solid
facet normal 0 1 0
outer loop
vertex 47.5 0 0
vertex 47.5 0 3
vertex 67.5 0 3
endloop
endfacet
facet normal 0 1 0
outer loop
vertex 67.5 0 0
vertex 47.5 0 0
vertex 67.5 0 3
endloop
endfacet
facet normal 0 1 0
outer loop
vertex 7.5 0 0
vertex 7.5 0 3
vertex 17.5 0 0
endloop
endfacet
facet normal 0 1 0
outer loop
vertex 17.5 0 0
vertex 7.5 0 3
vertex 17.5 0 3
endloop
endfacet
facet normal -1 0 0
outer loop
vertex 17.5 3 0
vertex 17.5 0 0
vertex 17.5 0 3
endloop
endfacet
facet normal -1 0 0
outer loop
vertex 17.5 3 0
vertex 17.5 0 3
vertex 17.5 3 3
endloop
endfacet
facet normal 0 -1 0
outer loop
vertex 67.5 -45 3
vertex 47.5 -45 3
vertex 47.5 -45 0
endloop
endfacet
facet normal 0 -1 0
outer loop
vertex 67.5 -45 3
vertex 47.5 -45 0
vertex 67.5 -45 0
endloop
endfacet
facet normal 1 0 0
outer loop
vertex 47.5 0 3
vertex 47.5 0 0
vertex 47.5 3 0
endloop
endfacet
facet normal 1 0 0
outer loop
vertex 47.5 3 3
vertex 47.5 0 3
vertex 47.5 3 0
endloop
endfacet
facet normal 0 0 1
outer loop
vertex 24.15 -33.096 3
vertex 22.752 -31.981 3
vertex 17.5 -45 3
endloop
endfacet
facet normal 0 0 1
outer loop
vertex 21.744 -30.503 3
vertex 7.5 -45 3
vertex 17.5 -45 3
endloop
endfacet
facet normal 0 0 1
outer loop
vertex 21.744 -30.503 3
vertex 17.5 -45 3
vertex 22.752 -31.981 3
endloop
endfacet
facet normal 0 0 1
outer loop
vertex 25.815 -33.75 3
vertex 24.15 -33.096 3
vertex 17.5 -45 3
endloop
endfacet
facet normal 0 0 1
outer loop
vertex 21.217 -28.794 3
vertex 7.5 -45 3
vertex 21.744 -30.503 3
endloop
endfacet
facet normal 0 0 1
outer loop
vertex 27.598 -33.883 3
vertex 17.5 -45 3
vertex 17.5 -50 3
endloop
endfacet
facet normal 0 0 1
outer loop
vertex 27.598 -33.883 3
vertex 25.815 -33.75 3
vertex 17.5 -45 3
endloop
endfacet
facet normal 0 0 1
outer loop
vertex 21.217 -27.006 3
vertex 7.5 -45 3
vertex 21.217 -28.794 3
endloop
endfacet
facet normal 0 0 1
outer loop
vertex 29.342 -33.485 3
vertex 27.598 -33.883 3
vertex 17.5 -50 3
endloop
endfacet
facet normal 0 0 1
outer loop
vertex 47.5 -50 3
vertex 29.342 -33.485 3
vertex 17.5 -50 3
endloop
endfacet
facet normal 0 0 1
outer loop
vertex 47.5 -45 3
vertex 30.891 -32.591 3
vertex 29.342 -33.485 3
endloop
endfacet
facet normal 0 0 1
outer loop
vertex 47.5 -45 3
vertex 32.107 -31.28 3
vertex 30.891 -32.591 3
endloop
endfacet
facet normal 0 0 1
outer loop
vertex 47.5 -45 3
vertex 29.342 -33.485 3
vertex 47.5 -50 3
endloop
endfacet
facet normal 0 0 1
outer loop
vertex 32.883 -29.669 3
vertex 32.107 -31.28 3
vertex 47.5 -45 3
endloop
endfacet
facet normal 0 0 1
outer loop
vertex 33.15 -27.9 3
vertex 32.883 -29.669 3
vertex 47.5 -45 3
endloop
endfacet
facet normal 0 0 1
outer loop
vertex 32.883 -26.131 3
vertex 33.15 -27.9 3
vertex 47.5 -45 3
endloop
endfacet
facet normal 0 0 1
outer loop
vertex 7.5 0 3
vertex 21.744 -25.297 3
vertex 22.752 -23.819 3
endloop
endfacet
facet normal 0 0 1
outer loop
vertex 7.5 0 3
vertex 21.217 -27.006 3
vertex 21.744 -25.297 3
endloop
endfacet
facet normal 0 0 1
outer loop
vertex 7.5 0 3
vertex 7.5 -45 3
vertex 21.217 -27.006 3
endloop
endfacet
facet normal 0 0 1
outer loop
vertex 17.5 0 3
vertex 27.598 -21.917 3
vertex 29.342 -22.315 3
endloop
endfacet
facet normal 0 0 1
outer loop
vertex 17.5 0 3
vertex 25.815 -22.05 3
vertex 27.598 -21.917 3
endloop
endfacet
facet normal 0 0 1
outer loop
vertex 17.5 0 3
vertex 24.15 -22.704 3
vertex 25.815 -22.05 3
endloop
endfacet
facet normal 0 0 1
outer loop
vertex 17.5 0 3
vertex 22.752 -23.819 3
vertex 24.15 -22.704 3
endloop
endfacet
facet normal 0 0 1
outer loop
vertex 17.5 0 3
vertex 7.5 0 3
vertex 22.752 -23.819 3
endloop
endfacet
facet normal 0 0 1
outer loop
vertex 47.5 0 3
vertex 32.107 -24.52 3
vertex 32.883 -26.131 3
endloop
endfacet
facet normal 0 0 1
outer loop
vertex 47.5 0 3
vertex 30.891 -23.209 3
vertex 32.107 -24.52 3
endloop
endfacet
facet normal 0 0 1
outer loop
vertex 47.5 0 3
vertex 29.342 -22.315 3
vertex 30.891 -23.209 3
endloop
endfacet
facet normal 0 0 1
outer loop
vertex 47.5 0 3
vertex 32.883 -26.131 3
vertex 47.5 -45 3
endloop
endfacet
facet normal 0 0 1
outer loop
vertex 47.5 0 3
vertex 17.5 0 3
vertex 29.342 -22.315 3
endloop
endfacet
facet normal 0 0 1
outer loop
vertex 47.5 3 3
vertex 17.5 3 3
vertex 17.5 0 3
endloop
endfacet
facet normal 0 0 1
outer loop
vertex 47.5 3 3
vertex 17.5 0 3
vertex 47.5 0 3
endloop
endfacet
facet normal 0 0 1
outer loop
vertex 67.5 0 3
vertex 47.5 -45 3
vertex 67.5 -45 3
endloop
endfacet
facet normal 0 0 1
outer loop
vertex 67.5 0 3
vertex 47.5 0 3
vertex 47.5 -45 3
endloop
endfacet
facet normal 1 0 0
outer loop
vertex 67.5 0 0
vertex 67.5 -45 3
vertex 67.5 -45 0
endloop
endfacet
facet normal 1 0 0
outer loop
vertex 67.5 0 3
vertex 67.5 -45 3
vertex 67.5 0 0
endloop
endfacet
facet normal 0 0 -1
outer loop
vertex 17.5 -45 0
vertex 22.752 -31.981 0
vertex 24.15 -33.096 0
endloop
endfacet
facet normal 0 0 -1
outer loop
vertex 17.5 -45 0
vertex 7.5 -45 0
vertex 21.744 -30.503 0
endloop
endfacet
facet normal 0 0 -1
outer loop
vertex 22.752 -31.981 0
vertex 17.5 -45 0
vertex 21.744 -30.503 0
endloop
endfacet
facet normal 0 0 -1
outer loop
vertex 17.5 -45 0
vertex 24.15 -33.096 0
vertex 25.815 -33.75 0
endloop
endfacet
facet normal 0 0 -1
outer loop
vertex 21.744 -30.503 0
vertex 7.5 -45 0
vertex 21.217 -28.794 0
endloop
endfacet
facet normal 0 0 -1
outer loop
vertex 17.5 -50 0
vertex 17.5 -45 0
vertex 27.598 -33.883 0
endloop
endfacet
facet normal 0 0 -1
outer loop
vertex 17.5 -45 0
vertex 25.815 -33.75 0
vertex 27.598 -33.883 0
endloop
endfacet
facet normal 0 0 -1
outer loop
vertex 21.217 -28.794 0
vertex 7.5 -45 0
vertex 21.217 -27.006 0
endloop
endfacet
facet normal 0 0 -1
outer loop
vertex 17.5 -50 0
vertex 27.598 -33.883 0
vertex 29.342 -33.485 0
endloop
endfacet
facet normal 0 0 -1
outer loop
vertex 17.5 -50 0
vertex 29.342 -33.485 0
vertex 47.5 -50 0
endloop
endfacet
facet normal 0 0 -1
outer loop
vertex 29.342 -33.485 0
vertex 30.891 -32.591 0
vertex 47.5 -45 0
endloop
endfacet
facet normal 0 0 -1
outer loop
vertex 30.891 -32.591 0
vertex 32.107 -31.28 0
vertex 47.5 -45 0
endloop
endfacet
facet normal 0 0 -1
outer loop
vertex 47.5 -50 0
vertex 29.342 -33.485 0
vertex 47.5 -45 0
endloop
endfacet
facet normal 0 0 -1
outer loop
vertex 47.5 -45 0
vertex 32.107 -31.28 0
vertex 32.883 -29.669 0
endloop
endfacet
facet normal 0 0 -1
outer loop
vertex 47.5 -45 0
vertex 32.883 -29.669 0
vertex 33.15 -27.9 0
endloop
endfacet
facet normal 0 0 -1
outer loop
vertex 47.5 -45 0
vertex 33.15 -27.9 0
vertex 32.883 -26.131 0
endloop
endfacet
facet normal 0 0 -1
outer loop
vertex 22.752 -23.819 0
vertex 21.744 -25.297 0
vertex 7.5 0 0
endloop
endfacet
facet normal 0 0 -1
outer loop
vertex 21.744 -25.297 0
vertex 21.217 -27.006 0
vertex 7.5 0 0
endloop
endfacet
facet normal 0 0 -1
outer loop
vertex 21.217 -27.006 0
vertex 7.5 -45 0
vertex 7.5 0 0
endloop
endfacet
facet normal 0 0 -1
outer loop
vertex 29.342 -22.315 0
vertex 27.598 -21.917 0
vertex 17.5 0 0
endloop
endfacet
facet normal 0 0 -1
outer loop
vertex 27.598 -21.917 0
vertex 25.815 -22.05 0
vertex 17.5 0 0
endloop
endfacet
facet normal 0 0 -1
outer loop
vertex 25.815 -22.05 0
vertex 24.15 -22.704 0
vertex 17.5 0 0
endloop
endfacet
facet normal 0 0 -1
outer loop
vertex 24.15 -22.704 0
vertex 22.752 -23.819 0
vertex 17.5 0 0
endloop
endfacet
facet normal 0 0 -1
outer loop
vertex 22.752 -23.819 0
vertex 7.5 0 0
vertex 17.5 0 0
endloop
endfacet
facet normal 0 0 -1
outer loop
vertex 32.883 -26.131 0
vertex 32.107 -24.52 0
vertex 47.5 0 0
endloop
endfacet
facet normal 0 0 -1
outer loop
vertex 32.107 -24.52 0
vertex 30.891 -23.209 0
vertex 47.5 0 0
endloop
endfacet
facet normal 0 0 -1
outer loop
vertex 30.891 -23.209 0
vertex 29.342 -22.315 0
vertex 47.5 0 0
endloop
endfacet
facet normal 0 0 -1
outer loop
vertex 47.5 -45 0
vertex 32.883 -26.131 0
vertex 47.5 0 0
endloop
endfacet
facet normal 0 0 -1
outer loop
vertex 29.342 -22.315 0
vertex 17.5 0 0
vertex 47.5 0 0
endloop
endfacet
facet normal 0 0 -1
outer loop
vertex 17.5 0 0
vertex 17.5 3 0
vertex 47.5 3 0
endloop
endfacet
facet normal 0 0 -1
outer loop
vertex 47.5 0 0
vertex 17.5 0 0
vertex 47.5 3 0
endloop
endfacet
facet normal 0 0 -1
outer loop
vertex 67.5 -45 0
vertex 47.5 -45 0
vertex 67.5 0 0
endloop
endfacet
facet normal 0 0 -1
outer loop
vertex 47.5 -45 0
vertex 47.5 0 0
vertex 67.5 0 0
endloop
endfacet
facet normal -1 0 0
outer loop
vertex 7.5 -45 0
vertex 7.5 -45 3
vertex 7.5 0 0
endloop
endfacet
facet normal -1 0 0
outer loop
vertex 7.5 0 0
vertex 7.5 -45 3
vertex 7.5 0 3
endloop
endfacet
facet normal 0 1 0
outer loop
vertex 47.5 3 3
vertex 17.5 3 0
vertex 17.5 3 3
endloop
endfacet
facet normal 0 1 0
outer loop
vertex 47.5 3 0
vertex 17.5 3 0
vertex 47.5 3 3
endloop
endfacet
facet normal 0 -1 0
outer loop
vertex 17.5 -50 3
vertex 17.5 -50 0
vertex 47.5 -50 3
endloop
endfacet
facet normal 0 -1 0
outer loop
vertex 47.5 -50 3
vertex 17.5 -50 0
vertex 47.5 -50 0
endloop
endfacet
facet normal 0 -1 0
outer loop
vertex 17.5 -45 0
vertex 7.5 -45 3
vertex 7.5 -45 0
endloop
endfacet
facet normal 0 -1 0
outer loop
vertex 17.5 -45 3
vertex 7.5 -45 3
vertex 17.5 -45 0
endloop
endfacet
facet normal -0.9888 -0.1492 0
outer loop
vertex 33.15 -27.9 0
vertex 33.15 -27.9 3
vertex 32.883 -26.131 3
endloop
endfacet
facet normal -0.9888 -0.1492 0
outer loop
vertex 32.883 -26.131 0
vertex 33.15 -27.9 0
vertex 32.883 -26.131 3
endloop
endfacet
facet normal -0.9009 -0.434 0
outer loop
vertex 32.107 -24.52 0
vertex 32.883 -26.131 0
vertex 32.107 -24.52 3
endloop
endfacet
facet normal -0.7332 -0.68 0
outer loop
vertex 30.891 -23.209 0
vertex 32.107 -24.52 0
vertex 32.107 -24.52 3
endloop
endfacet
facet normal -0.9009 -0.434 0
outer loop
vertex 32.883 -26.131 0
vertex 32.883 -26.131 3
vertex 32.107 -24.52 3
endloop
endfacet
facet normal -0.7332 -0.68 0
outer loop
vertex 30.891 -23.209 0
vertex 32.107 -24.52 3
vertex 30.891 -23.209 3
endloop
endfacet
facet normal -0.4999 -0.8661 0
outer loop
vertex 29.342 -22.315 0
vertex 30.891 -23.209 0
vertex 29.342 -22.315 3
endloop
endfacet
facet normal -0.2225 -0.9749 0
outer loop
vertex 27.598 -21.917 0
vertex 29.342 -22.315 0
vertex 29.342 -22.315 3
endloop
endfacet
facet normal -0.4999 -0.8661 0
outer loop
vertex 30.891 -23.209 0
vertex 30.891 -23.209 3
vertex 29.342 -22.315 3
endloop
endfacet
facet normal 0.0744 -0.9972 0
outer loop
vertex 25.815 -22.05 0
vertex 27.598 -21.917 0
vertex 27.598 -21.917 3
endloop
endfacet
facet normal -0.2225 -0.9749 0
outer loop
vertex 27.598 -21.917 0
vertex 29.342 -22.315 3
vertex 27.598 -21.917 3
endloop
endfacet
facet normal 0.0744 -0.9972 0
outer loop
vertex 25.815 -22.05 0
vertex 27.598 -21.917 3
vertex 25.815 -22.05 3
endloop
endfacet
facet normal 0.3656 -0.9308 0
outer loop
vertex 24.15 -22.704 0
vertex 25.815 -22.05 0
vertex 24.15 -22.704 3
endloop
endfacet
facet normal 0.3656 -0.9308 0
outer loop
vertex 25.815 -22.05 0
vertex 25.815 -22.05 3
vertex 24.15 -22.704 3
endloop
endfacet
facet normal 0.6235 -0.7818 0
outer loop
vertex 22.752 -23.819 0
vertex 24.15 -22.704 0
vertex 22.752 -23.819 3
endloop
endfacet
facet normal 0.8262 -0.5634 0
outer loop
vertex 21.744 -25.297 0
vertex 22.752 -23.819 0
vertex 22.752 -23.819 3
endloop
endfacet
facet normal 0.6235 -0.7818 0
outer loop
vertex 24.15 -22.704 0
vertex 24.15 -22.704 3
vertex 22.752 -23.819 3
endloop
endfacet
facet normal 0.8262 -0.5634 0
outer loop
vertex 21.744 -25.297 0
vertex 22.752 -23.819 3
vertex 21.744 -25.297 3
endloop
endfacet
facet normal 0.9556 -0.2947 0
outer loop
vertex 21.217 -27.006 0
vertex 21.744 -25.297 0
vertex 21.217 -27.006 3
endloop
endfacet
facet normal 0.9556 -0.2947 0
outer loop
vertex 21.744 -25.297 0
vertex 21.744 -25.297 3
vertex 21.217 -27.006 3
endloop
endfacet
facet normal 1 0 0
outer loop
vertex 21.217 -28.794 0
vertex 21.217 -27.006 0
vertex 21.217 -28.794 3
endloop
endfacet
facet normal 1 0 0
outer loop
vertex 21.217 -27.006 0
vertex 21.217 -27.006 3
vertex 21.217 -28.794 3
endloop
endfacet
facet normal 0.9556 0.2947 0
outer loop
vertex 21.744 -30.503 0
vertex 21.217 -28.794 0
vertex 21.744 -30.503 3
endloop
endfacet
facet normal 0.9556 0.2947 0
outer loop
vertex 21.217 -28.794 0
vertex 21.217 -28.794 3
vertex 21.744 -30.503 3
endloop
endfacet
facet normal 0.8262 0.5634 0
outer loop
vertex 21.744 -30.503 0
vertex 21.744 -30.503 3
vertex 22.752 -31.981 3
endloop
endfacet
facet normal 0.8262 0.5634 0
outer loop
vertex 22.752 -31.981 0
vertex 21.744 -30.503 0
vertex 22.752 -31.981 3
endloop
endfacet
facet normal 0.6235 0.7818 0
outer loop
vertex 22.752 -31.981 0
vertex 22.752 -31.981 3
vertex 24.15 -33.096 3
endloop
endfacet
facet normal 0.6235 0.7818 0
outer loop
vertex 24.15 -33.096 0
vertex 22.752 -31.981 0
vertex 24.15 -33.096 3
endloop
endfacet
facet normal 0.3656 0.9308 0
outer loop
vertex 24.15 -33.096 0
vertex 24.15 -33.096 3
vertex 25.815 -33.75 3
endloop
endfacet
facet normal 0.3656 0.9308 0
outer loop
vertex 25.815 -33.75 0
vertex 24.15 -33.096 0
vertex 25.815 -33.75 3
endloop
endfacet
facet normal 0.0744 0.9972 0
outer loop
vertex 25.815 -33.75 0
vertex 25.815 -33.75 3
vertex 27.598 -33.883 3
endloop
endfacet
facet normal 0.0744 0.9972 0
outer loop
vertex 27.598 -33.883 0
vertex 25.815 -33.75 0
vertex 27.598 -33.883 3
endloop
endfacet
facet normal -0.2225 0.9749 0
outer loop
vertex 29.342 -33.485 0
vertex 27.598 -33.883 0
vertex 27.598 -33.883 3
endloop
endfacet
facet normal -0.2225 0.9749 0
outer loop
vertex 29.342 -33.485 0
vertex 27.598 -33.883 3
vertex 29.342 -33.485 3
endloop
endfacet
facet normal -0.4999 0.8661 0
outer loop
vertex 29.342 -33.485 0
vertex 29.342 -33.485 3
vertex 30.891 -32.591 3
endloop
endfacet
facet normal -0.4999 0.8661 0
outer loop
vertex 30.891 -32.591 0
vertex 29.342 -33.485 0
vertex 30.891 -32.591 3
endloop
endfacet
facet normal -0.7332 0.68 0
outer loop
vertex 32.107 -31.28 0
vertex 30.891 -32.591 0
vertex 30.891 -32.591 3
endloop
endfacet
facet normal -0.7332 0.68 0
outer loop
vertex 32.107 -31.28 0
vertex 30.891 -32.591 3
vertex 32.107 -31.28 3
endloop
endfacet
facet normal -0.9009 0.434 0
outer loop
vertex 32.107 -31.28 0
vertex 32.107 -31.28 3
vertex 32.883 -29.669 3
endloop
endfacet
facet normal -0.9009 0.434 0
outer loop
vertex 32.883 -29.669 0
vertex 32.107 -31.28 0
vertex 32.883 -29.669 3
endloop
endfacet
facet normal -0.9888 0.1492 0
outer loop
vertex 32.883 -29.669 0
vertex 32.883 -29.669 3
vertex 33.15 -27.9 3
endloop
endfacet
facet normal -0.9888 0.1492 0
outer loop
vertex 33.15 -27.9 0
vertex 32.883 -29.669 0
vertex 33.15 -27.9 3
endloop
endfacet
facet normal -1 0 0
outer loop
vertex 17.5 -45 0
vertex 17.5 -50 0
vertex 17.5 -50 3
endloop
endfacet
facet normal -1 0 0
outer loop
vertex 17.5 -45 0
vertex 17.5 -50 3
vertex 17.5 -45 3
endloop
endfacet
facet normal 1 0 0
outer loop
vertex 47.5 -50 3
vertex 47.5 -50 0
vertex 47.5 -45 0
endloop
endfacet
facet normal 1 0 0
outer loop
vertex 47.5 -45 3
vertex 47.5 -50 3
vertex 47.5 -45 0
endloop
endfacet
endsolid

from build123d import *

# Parameters (mm, degrees)
SCHIZZO1_W                   = 30
SCHIZZO1_H                   = 53
ESTRUSIONE_ESTRUSIONE1_DEPTH = 3
SCHIZZO3_W                   = 10
SCHIZZO3_H                   = 45
SCHIZZO3_W_2                 = 20
ESTRUSIONE_ESTRUSIONE2_DEPTH = 3
SCHIZZO5_R                   = 6
TAGLIO_ESTRUSIONE1_DEPTH     = 85.055041491


with BuildPart() as part:
    # Schizzo1 → Estrusione-Estrusione1 (new body)
    with BuildSketch(Plane.XY):
        with Locations((32.5, -23.5)):
            Rectangle(SCHIZZO1_W, SCHIZZO1_H)
    extrude(amount=ESTRUSIONE_ESTRUSIONE1_DEPTH)

    # Schizzo3 → Estrusione-Estrusione2 (add)
    with BuildSketch(Plane.XY.offset(3)):
        with Locations((12.5, -22.5)):
            Rectangle(SCHIZZO3_W, SCHIZZO3_H)
        with Locations((57.5, -22.5)):
            Rectangle(SCHIZZO3_W_2, SCHIZZO3_H)
    extrude(amount=-ESTRUSIONE_ESTRUSIONE2_DEPTH)

    # Schizzo5 → Taglio-Estrusione1 (cut, through all)
    with BuildSketch(Plane.XY.offset(3)):
        with Locations((27.15, -27.9)):
            Circle(SCHIZZO5_R)
    extrude(amount=-TAGLIO_ESTRUSIONE1_DEPTH, mode=Mode.SUBTRACT)


solid = part.part
